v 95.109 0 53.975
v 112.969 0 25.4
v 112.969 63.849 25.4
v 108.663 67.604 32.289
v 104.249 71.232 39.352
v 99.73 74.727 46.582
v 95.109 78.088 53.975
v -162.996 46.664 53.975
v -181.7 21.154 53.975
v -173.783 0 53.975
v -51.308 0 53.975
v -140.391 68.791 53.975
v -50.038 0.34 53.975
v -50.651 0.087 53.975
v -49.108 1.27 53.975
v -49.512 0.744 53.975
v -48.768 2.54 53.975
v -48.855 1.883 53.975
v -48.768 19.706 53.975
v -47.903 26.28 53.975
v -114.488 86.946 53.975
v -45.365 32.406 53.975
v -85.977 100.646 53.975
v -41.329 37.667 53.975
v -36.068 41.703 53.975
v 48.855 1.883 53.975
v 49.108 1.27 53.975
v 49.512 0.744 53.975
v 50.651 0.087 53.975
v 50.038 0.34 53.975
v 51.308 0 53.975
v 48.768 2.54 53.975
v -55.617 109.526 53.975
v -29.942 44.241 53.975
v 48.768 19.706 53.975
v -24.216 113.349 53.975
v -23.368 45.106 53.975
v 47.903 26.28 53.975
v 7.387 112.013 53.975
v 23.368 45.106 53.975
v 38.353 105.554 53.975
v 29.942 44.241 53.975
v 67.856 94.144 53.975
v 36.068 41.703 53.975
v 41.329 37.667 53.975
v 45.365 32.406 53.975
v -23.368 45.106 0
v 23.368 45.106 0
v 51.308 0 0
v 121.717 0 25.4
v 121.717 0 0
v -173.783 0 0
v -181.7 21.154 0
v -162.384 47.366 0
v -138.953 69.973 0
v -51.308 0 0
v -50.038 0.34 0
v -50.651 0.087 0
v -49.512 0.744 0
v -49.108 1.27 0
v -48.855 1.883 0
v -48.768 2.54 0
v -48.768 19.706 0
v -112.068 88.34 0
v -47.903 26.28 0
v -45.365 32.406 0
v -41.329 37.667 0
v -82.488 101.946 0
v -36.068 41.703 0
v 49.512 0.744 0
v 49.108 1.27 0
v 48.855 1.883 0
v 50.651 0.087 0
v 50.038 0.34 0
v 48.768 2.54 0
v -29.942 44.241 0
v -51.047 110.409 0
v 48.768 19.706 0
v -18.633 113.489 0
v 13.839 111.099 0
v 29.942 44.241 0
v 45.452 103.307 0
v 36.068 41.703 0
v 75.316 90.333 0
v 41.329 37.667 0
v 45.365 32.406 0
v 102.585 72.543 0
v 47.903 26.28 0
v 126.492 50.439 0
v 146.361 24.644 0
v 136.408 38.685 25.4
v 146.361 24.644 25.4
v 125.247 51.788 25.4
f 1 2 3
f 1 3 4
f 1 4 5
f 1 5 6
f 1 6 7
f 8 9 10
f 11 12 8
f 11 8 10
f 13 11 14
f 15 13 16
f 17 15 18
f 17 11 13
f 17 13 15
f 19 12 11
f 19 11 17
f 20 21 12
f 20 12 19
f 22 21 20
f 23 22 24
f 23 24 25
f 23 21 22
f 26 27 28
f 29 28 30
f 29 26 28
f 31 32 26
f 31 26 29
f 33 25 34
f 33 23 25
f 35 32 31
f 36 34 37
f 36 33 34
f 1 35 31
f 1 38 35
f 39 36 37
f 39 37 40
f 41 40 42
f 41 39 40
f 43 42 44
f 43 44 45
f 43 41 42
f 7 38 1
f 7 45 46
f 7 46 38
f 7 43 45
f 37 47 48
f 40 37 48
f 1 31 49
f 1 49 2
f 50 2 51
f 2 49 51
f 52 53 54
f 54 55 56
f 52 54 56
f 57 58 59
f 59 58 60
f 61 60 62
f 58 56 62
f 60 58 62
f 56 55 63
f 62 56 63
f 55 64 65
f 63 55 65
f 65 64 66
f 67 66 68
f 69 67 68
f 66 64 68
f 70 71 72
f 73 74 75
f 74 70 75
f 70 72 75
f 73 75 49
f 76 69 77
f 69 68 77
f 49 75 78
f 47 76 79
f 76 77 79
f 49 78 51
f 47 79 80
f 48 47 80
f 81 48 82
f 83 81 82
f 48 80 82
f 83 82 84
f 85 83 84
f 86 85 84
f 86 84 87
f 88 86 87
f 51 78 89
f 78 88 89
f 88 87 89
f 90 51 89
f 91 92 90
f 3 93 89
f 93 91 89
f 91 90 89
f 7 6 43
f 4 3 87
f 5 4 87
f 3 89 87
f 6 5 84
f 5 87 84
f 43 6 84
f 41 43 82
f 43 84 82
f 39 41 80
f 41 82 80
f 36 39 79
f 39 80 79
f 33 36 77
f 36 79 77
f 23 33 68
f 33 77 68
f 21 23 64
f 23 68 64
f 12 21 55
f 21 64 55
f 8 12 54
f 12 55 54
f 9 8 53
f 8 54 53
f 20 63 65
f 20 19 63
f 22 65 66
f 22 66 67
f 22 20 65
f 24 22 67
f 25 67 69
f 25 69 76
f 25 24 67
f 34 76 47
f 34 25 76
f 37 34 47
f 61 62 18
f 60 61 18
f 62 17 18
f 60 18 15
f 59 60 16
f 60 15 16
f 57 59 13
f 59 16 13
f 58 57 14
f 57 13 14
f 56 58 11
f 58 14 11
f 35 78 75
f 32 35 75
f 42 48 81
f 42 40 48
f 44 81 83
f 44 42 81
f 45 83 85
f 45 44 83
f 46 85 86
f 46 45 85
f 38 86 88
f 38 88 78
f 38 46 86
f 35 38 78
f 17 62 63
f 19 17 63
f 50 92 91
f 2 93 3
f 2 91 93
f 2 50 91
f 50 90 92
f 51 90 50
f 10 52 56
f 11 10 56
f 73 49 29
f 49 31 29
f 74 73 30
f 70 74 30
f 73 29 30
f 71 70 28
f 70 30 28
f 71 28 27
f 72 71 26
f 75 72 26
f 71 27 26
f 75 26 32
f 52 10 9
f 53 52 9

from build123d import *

# Parameters (mm, degrees)
BOSS_EXTRUDE1_DEPTH = 53.975
FILLET1_R           = 25.4
FILLET2_R           = 2.54
CHAMFER1_SIZE       = 38.1
CHAMFER2_SIZE       = 19.17726945
CUT_EXTRUDE2_DEPTH  = 221.930957303


with BuildPart() as part:
    # Sketch1 → Boss-Extrude1 (new body)
    with BuildSketch(Plane.XY):
        with BuildLine():
            Line((-48.768, 0), (-48.768, 45.106))
            Line((-48.768, 45.106), (48.768, 45.106))
            Line((48.768, 45.106), (48.768, 0))
            Line((48.768, 0), (159.817162922, 0))
            ThreePointArc((159.817162922, 0), (-16.571441881, 113.499698272), (-192.960046685, 0))
            Line((-192.960046685, 0), (-48.768, 0))
        make_face()
    extrude(amount=BOSS_EXTRUDE1_DEPTH)

    # Fillet1
    fillet1_edges = [part.edges().sort_by_distance(p)[0] for p in [
        (48.768, 45.106, 26.9875),
        (-48.768, 45.106, 26.9875),
    ]]
    fillet(fillet1_edges, radius=FILLET1_R)

    # Fillet2
    fillet2_edges = [part.edges().sort_by_distance(p)[0] for p in [
        (48.768, 0, 26.9875),
        (-48.768, 0, 26.9875),
    ]]
    fillet(fillet2_edges, radius=FILLET2_R)

    # Chamfer1
    # the kernel refuses this chamfer: 38.1, 28.765904175 mm, written as the material it takes off along each edge
    with BuildSketch(Plane(origin=(159.817162922, 0, -97.981121842), x_dir=(-0.47921828298651964, 0.8776957543770233, 0), z_dir=(0, 0, 1))) as chamfer1_piece_1:
        with BuildLine():
            Line((28.078418346, 0), (CHAMFER1_SIZE * 0.479218282987, CHAMFER1_SIZE * 0.877695754377))
            Line((CHAMFER1_SIZE * 0.479218282987, CHAMFER1_SIZE * 0.877695754377), (0, 0))
            ThreePointArc((0, 0), (14.253669202, -0.509031999), (28.078418346, 0))
        make_face()
    extrude(amount=249.937243683, mode=Mode.SUBTRACT)

    # Chamfer2
    # the kernel refuses this chamfer: 25.4, 19.17726945 mm, written as the material it takes off along each edge
    with BuildSketch(Plane(origin=(-192.960046685, 0, -61.621694141), x_dir=(1, 0, 0), z_dir=(0, 0, 1))) as chamfer2_piece_1:
        with BuildLine():
            Line((CHAMFER2_SIZE, 0), (11.259728132, 21.154322158))
            ThreePointArc((11.259728132, 21.154322158), (5.460860237, 11.048084579), (0, 0))
            Line((0, 0), (CHAMFER2_SIZE, 0))
        make_face()
    extrude(amount=177.218388283, mode=Mode.SUBTRACT)

    # Sketch2 → Cut-Extrude2 (cut, through all)
    with BuildSketch(Plane(origin=(0, 0, 0), x_dir=(1, 0, 0), z_dir=(0, 1, 0))):
        Polygon((112.968558119, -25.4), (49.468558119, -127), (163.768558119, -127), (163.768558119, -25.4), align=None)
    extrude(amount=CUT_EXTRUDE2_DEPTH, mode=Mode.SUBTRACT)


solid = part.part
